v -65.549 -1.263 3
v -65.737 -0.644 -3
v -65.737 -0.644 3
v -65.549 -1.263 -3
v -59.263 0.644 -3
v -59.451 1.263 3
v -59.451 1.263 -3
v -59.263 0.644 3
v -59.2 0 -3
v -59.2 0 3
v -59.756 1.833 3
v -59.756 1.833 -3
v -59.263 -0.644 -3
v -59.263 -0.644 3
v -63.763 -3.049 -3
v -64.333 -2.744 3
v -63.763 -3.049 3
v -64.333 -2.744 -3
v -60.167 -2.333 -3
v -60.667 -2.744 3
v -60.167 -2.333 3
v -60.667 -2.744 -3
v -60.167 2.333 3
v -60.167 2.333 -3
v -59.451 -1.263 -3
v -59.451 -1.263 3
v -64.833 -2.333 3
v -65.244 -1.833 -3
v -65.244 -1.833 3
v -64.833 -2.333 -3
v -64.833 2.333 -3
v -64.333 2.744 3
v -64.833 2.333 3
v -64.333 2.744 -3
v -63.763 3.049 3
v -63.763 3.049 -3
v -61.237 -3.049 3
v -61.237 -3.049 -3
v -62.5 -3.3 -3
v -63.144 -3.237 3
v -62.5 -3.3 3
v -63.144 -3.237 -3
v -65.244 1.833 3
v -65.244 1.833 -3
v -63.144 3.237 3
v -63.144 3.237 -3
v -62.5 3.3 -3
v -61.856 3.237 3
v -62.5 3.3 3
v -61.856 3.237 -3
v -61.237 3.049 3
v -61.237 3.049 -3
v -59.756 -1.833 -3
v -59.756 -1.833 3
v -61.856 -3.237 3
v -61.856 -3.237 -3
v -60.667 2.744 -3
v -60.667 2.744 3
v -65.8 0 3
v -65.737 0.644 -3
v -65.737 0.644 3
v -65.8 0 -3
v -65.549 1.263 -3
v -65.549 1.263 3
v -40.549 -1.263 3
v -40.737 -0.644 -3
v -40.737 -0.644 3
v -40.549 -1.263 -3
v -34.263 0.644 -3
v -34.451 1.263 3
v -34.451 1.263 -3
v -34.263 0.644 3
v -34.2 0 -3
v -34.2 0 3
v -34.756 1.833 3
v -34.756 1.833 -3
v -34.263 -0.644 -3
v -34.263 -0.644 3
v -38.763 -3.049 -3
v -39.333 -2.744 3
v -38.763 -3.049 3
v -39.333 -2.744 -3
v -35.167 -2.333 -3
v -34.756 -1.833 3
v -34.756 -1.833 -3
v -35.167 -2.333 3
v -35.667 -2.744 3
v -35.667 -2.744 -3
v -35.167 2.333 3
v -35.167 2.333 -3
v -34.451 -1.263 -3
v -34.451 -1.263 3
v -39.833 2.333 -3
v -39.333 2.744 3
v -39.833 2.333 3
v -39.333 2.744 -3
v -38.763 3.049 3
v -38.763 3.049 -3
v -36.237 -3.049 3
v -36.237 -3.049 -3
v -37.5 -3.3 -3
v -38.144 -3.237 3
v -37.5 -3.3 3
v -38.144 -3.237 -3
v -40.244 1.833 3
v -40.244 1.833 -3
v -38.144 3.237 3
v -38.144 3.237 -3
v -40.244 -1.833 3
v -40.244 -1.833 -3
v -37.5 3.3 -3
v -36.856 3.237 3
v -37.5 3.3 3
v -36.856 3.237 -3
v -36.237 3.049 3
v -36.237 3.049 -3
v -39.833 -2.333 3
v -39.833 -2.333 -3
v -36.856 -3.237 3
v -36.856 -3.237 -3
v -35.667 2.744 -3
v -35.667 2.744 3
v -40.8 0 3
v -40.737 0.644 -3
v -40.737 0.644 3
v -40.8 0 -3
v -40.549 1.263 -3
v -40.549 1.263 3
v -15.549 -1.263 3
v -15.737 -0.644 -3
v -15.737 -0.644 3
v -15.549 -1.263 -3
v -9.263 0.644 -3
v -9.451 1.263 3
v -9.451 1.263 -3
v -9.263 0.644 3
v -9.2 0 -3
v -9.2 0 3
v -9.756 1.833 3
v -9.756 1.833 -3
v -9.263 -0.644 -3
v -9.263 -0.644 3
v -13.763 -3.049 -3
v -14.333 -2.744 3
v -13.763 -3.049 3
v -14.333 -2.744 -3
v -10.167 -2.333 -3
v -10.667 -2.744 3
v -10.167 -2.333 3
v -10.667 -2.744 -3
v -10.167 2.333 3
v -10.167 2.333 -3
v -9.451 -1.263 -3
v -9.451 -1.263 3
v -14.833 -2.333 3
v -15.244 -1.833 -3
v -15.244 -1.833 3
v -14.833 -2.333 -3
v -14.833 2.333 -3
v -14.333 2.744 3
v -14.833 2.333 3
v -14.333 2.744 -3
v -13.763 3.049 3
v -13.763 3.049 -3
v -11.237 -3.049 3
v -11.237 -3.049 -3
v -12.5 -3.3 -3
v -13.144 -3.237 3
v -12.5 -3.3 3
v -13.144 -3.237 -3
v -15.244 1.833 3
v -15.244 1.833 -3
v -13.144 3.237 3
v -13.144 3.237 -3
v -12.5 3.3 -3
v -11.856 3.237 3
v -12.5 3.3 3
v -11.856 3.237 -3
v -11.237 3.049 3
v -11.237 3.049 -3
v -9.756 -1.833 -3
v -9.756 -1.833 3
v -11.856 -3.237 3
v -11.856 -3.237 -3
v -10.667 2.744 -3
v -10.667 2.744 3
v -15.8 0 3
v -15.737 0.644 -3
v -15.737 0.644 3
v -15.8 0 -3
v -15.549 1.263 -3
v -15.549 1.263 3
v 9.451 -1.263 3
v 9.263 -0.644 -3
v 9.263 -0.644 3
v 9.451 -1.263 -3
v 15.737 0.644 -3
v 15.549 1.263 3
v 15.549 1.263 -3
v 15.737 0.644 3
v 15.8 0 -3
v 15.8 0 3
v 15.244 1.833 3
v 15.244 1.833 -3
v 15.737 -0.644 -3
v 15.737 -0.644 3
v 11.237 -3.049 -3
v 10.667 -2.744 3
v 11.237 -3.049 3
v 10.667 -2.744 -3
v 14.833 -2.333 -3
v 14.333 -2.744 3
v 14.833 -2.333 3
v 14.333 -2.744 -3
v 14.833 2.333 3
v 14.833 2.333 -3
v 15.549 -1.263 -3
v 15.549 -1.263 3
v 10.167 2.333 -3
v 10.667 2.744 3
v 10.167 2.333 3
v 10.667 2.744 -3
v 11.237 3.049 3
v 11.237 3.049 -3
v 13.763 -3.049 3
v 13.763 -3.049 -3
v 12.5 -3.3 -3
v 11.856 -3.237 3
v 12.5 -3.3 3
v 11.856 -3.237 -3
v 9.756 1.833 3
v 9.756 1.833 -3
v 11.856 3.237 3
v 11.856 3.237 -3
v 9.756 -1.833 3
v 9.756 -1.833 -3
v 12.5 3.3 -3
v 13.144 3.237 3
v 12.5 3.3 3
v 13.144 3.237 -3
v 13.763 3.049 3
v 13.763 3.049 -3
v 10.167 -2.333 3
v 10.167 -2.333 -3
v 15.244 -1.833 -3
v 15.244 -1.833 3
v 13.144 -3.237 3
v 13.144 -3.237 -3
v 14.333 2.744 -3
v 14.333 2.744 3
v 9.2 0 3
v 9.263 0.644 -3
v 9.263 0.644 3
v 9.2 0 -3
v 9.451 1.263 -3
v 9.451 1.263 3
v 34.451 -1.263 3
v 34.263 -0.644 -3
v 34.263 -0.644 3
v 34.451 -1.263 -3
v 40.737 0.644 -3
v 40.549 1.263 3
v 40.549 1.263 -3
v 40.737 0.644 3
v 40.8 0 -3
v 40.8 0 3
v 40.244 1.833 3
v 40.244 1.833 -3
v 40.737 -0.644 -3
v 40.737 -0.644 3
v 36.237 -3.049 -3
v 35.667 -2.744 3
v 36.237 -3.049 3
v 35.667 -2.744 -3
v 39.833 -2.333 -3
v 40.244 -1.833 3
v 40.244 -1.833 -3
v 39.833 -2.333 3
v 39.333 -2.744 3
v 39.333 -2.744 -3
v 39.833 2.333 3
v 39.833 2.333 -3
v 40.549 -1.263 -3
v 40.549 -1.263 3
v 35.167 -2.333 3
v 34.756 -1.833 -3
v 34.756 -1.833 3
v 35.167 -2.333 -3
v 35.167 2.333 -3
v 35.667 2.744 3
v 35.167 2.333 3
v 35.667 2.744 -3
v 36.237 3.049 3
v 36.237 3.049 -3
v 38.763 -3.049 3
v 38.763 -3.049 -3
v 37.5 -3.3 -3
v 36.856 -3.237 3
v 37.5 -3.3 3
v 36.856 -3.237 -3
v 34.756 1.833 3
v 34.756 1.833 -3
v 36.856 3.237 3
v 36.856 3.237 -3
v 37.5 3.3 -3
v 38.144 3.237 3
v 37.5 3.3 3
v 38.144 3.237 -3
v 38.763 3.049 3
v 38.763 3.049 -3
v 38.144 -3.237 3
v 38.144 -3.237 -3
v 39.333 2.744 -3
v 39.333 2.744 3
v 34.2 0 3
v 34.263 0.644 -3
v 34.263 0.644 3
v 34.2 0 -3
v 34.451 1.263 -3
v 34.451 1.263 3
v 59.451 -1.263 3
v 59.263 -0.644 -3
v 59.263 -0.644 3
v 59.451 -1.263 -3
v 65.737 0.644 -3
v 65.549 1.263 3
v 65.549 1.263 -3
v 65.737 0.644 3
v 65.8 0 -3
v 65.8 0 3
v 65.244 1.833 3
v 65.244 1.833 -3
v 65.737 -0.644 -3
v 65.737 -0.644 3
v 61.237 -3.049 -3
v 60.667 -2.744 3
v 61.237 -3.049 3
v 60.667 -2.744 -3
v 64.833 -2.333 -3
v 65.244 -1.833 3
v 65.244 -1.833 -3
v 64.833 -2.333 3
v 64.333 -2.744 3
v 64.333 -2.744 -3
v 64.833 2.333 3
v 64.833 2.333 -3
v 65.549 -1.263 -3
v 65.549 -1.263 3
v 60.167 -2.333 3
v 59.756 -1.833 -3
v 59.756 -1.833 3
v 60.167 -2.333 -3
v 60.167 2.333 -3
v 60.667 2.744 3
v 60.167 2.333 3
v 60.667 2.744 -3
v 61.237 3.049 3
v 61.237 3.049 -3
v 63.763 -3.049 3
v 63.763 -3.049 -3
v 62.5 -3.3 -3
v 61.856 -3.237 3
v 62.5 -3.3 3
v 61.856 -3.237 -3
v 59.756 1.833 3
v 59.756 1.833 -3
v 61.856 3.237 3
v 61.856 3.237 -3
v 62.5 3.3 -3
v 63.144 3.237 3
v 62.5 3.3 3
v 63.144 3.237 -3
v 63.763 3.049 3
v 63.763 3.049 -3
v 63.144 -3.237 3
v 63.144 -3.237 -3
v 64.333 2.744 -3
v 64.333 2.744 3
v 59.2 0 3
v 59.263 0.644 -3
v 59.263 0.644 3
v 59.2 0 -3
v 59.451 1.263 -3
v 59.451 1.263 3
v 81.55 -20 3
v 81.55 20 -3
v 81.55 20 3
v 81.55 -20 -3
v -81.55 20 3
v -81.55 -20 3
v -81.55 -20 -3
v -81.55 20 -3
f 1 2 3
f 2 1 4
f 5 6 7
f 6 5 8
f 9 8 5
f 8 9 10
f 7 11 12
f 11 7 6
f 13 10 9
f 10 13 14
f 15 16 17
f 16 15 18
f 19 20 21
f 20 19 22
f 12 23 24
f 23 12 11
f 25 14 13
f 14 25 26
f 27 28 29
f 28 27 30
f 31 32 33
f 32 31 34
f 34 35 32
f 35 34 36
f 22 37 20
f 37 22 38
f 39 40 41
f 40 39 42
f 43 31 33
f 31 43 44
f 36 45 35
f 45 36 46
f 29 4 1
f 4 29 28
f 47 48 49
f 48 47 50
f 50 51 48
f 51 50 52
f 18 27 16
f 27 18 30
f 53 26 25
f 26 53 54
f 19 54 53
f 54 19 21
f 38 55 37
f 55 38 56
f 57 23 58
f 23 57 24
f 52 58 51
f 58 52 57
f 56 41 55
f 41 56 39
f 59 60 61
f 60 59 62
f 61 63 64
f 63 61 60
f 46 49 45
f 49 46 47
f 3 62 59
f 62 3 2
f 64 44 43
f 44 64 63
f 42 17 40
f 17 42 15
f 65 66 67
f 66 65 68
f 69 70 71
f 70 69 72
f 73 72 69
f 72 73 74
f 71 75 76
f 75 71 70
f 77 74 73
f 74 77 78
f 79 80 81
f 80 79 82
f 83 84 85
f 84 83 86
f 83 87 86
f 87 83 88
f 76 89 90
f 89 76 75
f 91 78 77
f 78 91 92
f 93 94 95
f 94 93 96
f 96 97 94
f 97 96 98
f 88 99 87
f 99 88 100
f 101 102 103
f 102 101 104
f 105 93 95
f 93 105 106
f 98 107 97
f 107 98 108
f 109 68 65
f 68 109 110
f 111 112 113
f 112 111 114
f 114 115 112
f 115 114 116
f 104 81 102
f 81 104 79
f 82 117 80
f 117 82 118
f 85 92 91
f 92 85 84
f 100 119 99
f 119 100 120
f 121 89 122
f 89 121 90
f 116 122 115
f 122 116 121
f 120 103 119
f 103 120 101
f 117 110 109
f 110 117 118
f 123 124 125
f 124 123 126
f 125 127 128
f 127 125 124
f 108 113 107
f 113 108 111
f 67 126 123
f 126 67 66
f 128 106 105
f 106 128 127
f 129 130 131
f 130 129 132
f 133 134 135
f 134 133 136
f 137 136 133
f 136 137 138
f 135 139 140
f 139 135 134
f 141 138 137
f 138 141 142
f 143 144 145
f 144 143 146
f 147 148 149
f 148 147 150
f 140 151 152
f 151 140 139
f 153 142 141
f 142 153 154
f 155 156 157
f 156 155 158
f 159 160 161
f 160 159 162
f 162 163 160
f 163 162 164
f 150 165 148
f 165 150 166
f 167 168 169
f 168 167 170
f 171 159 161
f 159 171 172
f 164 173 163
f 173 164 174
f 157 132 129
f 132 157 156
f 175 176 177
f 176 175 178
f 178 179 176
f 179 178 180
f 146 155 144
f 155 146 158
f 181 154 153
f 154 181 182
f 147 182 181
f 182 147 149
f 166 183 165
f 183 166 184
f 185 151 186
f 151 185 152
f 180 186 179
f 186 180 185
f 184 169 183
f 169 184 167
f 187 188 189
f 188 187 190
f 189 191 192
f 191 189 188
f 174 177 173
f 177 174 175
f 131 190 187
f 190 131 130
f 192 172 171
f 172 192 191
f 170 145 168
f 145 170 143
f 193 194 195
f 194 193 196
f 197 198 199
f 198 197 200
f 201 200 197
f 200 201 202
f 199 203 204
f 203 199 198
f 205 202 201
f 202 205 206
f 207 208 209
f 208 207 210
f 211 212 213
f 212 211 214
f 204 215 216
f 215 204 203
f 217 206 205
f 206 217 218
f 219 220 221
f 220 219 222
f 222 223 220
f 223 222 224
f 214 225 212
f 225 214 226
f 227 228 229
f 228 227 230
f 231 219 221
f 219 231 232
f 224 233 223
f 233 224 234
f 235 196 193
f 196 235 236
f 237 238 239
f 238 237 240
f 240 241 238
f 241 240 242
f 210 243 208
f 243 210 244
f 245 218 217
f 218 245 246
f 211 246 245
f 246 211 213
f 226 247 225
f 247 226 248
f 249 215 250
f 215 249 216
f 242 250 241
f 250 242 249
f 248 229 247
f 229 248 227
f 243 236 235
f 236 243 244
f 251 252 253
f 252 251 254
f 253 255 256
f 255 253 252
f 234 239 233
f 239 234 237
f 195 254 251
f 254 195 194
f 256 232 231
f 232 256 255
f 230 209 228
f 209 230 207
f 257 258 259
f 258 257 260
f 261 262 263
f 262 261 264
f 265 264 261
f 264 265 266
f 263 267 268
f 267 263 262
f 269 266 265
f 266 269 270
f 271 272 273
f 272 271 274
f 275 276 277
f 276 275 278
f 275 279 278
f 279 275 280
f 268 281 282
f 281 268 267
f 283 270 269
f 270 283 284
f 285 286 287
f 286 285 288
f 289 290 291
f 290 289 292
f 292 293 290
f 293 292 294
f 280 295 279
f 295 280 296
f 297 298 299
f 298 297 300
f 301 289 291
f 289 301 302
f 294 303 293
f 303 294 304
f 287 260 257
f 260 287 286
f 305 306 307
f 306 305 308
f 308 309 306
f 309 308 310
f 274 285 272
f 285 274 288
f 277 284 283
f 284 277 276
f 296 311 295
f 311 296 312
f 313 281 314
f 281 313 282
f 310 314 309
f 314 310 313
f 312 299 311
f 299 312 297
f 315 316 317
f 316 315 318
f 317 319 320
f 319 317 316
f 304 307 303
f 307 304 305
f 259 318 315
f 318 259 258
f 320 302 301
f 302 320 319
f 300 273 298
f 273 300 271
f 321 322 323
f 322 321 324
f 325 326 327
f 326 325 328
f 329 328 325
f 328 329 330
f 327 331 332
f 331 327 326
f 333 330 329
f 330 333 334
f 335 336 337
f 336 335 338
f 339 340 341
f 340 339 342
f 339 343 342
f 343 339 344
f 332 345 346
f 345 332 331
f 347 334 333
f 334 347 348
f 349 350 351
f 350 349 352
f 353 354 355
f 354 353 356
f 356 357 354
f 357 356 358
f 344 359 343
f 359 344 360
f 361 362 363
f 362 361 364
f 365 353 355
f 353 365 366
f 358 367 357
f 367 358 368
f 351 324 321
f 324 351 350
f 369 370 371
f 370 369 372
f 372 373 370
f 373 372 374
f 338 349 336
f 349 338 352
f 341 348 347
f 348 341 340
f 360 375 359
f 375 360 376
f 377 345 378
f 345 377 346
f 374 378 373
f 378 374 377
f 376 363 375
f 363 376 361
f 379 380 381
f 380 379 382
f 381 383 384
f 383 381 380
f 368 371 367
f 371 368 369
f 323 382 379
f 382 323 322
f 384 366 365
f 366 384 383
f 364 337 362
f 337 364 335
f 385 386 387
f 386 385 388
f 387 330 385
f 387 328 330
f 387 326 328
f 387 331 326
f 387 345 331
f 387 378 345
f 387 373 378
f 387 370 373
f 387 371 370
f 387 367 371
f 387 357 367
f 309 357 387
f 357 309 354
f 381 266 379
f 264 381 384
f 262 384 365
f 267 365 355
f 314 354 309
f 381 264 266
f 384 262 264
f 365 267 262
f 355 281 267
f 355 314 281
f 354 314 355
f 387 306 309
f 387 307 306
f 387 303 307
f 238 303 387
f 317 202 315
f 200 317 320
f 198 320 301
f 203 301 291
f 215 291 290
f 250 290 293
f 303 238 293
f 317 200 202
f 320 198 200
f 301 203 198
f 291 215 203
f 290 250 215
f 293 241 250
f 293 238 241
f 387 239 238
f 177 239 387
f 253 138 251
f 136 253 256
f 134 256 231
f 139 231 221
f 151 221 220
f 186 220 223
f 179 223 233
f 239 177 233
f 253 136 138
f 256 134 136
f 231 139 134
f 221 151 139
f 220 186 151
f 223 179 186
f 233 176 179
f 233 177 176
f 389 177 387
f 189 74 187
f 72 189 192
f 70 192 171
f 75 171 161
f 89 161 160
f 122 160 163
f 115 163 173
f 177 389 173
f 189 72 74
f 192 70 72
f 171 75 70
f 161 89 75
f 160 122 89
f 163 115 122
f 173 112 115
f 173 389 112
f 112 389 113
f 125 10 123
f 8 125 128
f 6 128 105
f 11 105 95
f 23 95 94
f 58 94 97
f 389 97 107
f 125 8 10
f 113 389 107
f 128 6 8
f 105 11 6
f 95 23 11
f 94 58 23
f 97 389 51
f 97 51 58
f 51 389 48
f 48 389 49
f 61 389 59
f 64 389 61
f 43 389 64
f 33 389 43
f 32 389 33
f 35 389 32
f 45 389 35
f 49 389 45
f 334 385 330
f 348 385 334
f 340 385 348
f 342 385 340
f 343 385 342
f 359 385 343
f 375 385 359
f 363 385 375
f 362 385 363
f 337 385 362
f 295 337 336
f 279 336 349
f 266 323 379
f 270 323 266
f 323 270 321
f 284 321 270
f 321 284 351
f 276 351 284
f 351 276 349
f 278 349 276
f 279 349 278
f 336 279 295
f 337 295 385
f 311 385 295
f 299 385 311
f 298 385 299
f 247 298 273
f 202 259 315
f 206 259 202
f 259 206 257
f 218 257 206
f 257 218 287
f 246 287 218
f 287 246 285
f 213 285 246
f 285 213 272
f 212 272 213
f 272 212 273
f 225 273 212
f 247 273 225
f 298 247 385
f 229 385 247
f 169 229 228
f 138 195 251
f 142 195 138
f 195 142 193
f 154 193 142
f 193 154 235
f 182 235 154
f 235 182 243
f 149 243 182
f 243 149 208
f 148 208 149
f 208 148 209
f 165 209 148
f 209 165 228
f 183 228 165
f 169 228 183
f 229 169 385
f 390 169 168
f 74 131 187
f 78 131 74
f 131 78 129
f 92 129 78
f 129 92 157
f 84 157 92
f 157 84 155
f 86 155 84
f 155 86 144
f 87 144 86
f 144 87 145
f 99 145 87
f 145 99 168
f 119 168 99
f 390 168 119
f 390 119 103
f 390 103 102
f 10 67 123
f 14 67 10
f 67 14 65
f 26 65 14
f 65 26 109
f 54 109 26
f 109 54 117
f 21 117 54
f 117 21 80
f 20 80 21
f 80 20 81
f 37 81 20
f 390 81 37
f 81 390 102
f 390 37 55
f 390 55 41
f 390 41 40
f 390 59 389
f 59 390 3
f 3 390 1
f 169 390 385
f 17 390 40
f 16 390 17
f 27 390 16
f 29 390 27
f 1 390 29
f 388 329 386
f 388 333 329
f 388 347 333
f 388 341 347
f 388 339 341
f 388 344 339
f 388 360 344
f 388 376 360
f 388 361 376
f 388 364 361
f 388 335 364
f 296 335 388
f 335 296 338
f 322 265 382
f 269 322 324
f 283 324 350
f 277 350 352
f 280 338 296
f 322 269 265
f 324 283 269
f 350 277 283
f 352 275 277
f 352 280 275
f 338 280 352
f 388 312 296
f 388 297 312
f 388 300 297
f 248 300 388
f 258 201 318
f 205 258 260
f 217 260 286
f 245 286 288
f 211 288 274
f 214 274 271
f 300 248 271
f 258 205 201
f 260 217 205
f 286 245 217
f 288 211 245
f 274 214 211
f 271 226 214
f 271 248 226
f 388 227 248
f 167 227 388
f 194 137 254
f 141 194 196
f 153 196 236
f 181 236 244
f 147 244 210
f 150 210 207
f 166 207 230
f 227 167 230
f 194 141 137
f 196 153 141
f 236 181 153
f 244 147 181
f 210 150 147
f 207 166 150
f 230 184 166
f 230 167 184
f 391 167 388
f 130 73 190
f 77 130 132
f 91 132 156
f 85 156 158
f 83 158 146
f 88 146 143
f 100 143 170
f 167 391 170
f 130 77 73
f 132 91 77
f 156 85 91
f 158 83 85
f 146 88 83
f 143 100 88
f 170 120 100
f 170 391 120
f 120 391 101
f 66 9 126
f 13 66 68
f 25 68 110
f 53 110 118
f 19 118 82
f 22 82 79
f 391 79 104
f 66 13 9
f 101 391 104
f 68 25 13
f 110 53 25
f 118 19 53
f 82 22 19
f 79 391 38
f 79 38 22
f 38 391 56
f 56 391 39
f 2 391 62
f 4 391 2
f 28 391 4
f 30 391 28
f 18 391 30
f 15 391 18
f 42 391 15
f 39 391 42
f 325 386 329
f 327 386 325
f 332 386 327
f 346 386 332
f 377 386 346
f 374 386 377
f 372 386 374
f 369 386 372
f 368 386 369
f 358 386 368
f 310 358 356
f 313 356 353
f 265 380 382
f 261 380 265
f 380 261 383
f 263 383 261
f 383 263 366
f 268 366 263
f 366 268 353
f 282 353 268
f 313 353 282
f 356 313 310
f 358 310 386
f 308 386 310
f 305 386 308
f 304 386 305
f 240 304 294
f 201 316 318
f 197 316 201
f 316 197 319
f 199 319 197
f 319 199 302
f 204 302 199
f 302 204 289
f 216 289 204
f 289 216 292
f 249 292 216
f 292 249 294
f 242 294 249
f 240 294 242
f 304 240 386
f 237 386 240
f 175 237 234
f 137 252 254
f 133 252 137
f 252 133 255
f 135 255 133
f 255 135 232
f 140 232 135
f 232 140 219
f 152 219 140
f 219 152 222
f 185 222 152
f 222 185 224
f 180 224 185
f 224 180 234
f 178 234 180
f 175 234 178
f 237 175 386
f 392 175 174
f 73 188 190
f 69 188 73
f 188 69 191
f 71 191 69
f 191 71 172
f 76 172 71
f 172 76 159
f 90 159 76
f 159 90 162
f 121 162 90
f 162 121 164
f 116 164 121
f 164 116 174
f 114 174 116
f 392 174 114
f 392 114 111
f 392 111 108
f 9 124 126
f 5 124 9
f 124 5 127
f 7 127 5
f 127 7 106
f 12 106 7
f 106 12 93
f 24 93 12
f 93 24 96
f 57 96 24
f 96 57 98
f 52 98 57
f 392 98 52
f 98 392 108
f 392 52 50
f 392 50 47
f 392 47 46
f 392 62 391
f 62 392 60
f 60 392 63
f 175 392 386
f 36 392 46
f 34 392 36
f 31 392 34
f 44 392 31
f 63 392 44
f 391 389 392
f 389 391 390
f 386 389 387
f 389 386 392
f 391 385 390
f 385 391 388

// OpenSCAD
$fn = 32;

// ----------------------------------------------------------------------
// Hole bar, 6 x Ø6.6
// skip layout, 19.05 mm edge offset
// ----------------------------------------------------------------------

// --- parameters (mm) ---
bar_w = 40;         // bar width (Y)
bar_t = 6;          // bar thickness (Z)
holes = 6;          // holes per row
hole_d = 6.6;       // hole diameter
edge = 19.05;       // offset from the bar end to the first hole
grid_pitch = 12.5;  // grid the bar was laid out on

// --- derived feature positions (mm) ---
pitch = grid_pitch * 2;       // = 25   holes sit every other grid slot
span = (holes - 1) * pitch;   // = 125   distance between the end holes
bar_l = span + 2 * edge;      // = 163.1   overall bar length
start_x = -bar_l / 2 + edge;  // = -62.5   X of the first hole
feature_centers = [
  [start_x + 0 * pitch, 0],
  [start_x + 1 * pitch, 0],
  [start_x + 2 * pitch, 0],
  [start_x + 3 * pitch, 0],
  [start_x + 4 * pitch, 0],
  [start_x + 5 * pitch, 0]
];   // hole centres of the first row

// bar with one row of holes, drilled from feature_centers
difference() {
  translate([-bar_l / 2, -bar_w / 2, -bar_t / 2]) cube([bar_l, bar_w, bar_t]);
  for (centre = feature_centers)
    translate([centre[0], centre[1], 0])
      cylinder(d = hole_d, h = bar_t + 2, center = true);
}
